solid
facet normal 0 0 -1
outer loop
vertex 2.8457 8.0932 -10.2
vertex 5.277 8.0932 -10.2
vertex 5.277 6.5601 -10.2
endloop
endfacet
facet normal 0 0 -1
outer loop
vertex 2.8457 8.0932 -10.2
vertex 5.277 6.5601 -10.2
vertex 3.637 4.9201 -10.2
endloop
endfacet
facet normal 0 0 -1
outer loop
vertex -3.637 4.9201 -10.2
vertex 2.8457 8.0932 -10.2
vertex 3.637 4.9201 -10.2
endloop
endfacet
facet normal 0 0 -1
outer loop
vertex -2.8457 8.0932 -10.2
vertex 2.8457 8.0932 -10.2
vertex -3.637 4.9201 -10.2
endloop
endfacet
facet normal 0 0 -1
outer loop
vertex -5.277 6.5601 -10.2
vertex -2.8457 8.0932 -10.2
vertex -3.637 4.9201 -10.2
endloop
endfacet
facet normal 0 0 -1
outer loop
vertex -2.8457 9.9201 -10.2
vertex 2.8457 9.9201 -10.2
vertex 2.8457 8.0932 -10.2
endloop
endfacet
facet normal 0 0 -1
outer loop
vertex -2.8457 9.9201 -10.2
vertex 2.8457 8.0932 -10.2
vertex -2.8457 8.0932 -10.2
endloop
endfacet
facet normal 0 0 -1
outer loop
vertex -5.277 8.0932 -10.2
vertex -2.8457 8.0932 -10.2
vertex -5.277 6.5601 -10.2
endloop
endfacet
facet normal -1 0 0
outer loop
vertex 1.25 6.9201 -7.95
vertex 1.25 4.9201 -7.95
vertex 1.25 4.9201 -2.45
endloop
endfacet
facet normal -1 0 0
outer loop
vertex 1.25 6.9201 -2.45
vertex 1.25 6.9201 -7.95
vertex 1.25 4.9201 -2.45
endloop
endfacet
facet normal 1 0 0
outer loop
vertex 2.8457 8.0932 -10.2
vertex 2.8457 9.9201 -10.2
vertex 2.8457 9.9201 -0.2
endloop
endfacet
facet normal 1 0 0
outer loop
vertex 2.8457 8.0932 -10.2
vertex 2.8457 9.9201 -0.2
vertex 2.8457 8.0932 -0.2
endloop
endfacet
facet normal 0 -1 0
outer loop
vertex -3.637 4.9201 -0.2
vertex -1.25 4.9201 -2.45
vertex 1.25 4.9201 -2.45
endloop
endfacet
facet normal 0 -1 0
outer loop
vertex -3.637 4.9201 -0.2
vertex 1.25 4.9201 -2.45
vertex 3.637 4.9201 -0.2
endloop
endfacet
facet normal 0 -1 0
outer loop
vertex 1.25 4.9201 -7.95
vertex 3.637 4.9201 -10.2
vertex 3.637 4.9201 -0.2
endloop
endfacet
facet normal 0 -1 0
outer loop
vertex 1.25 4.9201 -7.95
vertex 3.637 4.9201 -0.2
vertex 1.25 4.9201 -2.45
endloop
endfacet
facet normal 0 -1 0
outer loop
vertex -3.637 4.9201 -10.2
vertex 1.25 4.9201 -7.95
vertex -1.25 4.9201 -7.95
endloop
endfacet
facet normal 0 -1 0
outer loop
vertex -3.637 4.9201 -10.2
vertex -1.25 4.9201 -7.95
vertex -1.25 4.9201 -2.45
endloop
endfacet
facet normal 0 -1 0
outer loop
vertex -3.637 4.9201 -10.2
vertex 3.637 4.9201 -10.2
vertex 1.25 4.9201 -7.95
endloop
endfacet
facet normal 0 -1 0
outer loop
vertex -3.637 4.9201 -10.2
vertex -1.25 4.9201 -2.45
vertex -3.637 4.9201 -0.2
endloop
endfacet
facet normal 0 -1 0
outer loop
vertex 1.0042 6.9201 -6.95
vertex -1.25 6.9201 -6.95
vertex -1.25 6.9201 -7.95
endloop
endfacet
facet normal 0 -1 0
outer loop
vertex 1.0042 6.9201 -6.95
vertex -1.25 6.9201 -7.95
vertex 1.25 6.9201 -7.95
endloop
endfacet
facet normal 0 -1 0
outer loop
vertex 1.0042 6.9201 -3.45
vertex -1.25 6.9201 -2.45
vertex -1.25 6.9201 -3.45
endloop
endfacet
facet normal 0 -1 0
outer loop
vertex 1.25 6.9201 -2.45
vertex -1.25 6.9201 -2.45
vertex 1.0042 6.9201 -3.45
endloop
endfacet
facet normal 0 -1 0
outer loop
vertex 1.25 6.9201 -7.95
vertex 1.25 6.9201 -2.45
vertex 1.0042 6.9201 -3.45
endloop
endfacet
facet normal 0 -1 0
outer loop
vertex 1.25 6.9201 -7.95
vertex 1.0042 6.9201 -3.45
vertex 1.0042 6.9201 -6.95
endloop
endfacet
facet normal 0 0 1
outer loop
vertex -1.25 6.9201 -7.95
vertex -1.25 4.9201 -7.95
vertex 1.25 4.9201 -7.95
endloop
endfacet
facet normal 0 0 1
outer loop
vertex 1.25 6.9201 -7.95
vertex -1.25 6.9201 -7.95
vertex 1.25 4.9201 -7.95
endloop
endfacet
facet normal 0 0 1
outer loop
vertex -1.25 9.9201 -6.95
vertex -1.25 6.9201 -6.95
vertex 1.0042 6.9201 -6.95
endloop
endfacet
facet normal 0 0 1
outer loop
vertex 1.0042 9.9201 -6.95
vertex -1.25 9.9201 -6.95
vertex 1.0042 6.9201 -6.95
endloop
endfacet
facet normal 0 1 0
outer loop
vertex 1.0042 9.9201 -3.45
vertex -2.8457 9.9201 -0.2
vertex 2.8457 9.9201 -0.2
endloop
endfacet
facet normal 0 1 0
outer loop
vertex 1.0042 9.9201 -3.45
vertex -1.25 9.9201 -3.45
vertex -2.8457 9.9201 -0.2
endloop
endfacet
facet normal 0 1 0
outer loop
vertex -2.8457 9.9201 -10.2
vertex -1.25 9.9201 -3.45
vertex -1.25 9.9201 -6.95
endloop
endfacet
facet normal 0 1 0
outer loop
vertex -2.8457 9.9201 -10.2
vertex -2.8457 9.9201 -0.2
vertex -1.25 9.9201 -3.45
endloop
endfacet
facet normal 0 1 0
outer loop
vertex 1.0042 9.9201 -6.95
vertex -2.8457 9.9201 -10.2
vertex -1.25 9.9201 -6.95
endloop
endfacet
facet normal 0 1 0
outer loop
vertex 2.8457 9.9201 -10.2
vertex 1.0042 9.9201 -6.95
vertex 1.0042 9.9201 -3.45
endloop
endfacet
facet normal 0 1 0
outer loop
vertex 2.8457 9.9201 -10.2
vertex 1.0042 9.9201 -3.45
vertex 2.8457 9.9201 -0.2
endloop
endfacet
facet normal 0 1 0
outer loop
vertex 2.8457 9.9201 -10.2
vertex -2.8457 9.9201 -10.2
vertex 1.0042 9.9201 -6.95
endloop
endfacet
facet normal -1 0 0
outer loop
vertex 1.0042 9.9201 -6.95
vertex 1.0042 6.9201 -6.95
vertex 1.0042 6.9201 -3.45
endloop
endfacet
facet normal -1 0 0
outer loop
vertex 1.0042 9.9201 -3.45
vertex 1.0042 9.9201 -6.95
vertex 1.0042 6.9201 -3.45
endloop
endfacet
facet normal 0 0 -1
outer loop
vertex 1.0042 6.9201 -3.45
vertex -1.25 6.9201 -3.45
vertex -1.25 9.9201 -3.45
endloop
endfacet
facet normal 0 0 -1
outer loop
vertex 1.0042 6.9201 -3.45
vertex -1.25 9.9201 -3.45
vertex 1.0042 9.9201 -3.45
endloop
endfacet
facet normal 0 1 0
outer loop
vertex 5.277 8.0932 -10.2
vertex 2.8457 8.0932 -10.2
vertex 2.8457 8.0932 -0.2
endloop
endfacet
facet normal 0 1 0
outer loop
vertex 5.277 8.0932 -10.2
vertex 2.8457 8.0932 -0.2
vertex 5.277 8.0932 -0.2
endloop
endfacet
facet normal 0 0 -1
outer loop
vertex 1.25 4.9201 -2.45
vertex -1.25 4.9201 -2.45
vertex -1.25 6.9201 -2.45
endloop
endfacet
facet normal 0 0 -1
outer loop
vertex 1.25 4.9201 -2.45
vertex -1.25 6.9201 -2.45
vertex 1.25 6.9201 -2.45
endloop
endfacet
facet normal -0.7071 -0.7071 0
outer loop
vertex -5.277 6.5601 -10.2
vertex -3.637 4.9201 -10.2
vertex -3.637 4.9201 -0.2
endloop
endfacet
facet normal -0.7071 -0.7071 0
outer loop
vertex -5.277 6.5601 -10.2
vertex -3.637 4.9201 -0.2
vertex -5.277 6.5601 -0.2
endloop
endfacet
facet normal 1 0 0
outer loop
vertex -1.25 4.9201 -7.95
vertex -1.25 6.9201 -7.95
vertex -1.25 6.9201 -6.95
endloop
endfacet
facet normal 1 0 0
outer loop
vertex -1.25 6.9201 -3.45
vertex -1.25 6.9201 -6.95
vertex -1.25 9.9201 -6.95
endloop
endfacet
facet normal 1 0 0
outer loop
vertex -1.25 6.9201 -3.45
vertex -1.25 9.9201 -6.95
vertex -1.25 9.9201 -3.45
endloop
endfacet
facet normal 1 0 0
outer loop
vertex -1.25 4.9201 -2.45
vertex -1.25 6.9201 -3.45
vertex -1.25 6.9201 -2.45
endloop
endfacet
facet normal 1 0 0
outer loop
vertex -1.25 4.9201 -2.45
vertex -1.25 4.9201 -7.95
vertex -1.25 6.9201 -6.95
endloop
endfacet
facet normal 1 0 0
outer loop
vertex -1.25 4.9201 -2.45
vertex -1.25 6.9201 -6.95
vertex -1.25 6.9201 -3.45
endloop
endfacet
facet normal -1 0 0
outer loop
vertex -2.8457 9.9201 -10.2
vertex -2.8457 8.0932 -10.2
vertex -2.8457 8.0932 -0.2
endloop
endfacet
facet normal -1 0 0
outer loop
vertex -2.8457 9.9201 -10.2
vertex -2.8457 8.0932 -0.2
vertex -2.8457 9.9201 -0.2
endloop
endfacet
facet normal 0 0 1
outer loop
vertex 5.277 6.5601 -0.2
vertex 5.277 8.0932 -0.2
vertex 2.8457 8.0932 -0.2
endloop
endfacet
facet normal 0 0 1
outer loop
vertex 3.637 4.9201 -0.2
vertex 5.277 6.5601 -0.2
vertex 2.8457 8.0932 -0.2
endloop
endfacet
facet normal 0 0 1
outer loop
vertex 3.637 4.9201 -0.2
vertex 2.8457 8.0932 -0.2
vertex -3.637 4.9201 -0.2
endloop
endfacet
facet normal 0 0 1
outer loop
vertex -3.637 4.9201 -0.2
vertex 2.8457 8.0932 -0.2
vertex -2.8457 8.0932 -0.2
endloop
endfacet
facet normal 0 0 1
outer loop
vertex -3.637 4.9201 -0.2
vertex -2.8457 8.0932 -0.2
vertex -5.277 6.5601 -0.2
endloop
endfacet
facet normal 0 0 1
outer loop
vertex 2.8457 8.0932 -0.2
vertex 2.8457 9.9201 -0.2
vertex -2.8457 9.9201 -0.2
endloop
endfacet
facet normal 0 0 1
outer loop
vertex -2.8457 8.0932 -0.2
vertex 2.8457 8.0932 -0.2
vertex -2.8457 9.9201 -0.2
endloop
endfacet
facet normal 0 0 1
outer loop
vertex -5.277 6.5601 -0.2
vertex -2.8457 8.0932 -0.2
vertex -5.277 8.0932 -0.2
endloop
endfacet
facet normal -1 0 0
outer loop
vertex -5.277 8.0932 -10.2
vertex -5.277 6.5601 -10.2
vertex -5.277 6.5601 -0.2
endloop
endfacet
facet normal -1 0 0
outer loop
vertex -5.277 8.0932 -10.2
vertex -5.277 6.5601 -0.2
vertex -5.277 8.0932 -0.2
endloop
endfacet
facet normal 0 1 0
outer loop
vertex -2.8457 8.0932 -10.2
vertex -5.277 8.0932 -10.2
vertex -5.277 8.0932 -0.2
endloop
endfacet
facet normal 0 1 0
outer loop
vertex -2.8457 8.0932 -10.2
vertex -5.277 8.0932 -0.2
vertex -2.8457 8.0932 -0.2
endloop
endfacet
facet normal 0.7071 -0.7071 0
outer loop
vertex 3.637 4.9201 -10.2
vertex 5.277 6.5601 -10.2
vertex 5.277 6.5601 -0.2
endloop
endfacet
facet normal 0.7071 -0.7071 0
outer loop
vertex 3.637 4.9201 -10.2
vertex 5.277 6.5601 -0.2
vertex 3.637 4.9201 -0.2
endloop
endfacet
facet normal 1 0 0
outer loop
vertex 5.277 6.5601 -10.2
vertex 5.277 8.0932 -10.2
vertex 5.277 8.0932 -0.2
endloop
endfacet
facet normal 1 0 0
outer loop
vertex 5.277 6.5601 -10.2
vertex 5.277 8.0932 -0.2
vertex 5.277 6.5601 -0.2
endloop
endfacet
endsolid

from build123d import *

# Parameters (mm, degrees)
PAD_DEPTH       = 10
SKETCH002_W     = 2.5
SKETCH002_H     = 5.5
POCKET_DEPTH    = 2
SKETCH003_W     = 2.254226
SKETCH003_H     = 3.5
POCKET001_DEPTH = 5


with BuildPart() as part:
    # Sketch001 → Pad (new body)
    with BuildSketch(Plane.XY):
        Polygon((5.277013, 8.093206), (5.277013, 6.560121), (3.637013, 4.920121), (-3.637013, 4.920121), (-5.277013, 6.560121), (-5.277013, 8.093206), (-2.845653, 8.093206), (-2.845653, 9.920121), (2.845653, 9.920121), (2.845653, 8.093206), align=None)
    extrude(amount=PAD_DEPTH)

    # Sketch002 (on Face3 of Pad) → Pocket (cut)
    with BuildSketch(Plane.XZ.offset(-4.920121)):
        with Locations((0, 5)):
            Rectangle(SKETCH002_W, SKETCH002_H)
    extrude(amount=-POCKET_DEPTH, mode=Mode.SUBTRACT)

    # Sketch003 (on Face17 of Pocket) → Pocket001 (cut)
    with BuildSketch(Plane.XZ.offset(-6.920121)):
        with Locations((-0.122887, 5)):
            Rectangle(SKETCH003_W, SKETCH003_H)
    extrude(amount=-POCKET001_DEPTH, mode=Mode.SUBTRACT)


with BuildPart() as part_1:
    # Body placement: moved
    add(part.part.moved(Location((0, 0, -10.2))))


solid = part_1.part
